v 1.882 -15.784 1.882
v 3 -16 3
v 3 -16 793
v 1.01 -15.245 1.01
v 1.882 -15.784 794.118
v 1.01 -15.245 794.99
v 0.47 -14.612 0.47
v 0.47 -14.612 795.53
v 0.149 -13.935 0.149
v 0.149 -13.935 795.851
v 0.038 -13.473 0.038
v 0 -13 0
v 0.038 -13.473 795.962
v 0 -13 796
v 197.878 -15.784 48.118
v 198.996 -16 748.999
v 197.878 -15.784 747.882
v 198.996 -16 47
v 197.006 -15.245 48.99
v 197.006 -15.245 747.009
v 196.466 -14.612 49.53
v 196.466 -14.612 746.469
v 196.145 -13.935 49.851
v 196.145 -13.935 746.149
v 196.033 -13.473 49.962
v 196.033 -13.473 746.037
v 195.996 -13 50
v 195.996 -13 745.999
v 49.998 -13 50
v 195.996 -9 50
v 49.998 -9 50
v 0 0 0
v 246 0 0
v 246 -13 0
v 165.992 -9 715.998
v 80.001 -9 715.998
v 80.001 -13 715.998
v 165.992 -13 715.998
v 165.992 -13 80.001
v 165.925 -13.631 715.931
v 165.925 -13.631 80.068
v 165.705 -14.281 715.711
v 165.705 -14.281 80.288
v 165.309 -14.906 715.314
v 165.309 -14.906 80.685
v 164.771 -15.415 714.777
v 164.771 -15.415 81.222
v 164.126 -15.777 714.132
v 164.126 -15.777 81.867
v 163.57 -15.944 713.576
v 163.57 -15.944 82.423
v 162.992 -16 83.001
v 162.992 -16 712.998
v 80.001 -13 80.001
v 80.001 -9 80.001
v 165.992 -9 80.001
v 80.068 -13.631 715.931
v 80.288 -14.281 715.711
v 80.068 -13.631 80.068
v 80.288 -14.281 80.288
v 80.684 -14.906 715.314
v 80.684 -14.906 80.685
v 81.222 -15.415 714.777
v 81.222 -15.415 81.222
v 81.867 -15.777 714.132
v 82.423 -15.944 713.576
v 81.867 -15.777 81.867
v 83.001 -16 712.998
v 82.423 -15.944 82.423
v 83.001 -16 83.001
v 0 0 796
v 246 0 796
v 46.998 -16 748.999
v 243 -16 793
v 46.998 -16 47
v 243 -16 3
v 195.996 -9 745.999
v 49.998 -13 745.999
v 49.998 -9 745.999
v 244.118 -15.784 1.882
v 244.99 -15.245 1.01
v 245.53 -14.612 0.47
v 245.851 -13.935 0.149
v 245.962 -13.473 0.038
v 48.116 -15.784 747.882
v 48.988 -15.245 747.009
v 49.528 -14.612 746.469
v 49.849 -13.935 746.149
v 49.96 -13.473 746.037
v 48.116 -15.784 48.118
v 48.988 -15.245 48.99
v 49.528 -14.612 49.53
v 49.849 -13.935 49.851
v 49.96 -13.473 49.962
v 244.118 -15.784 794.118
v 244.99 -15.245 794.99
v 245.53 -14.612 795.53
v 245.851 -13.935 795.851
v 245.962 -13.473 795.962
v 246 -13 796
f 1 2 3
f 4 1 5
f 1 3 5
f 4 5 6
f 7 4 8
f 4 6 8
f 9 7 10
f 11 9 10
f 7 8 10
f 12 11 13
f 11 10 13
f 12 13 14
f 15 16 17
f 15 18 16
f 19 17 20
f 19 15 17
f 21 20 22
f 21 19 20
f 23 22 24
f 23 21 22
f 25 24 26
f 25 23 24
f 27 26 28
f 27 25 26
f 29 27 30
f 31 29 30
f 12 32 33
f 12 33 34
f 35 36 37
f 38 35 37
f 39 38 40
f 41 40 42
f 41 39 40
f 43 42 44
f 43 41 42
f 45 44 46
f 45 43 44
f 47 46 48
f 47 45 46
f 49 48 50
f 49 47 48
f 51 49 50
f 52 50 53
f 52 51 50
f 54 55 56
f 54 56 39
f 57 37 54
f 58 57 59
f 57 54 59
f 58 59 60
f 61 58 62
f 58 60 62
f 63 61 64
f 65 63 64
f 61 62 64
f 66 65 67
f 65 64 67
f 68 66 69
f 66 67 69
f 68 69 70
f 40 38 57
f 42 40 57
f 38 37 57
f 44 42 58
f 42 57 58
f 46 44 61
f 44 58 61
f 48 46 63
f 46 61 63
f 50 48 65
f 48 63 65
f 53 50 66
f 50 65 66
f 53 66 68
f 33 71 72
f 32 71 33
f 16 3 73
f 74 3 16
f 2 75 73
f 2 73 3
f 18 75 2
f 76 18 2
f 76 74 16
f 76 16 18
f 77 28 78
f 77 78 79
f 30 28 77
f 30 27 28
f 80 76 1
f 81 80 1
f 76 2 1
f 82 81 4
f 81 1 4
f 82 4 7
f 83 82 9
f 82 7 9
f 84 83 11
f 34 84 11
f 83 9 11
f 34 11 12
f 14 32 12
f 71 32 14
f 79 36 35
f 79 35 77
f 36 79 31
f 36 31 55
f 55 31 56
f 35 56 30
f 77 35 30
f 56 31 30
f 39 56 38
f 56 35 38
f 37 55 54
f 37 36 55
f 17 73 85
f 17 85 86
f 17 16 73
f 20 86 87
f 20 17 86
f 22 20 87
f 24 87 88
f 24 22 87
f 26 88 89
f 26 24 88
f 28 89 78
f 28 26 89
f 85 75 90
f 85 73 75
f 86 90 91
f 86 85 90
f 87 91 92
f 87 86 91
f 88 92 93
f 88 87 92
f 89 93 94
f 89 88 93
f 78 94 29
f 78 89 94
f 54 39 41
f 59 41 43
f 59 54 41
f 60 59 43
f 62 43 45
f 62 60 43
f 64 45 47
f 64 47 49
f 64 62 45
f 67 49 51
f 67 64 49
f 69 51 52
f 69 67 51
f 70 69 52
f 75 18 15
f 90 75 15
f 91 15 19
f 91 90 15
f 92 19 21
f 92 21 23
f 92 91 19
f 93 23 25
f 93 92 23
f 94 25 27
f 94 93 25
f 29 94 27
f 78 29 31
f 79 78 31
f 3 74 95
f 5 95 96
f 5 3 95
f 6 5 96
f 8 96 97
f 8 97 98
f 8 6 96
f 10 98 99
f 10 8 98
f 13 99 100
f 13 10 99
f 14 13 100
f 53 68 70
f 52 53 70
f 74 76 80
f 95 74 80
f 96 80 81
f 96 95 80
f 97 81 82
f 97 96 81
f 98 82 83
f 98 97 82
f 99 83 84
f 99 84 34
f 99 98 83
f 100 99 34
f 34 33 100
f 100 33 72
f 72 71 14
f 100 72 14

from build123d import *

# Parameters (mm, degrees)
F0_W      = 44.656470418
F0_H      = 33.8078811765
F1_DEPTH  = 16
F2_DEPTH  = 796
F3_DEPTH  = 196
F4_W      = 68.9578056335
F4_H      = 493.6993122101
F5_DEPTH  = 7
F6_DEPTH  = 9.7
F7_DEPTH  = 99.33
F8_DEPTH  = 99.33
F9_DEPTH  = 17.34
F10_DEPTH = 102.97
F11_W     = 35.2807044983
F11_H     = 492.0964837074
F12_DEPTH = 7
F13_DEPTH = 37.27
F14_DEPTH = 6.58
F15_DEPTH = 106.63
F16_DEPTH = 5.87
F17_DEPTH = 200
F18_DEPTH = 200
F19_DEPTH = 200
F20_DEPTH = 200
F21_DEPTH = 200
F22_DEPTH = 200
F23_DEPTH = 350
F24_DEPTH = 350
F25_DEPTH = 350
F26_R     = 3


with BuildPart() as f1:
    # F0 (on Front) → F1 (new body)
    with BuildSketch(Plane.XZ):
        with Locations((22.328235209, 16.9039405882)):
            Rectangle(F0_W, F0_H)
    extrude(amount=F1_DEPTH)

    # F2 (add): a face of the model
    f2_faces = [f1.faces().sort_by_distance(p)[0] for p in [
        (22.328235209, -8, 0),
    ]]
    extrude(f2_faces, amount=-F2_DEPTH)

    # F3 (add): a face of the model
    f3_faces = [f1.faces().sort_by_distance(p)[0] for p in [
        (0, -8, 398),
    ]]
    extrude(f3_faces, amount=-F3_DEPTH)

    # F4 (on face) → F5 (cut)
    with BuildSketch(Plane.XZ.offset(16)):
        with Locations((94.1769480705, 399.8196721077)):
            Rectangle(F4_W, F4_H)
    extrude(amount=-F5_DEPTH, mode=Mode.SUBTRACT)

    # F6 (cut): a face of the model
    f6_faces = [f1.faces().sort_by_distance(p)[0] for p in [
        (59.6980452538, -12.5, 399.8196721077),
    ]]
    extrude(f6_faces, amount=-F6_DEPTH, mode=Mode.SUBTRACT)

    # F7 (add): a face of the model
    f7_faces = [f1.faces().sort_by_distance(p)[0] for p in [
        (89.3269480705, -12.5, 646.6693282127),
    ]]
    extrude(f7_faces, amount=-F7_DEPTH)

    # F8 (cut): a face of the model
    f8_faces = [f1.faces().sort_by_distance(p)[0] for p in [
        (89.3269480705, -12.5, 646.6693282127),
    ]]
    extrude(f8_faces, amount=-F8_DEPTH, mode=Mode.SUBTRACT)

    # F9 (cut): a face of the model
    f9_faces = [f1.faces().sort_by_distance(p)[0] for p in [
        (128.6558508873, -12.5, 449.4846721077),
    ]]
    extrude(f9_faces, amount=-F9_DEPTH, mode=Mode.SUBTRACT)

    # F10 (cut): a face of the model
    f10_faces = [f1.faces().sort_by_distance(p)[0] for p in [
        (97.9969480705, -12.5, 152.9700160027),
    ]]
    extrude(f10_faces, amount=-F10_DEPTH, mode=Mode.SUBTRACT)

    # F11 (on face) → F12 (join)
    with BuildSketch(Plane.XZ.offset(9)):
        with Locations((91.7714834213, 432.6795041561)):
            Rectangle(F11_W, F11_H)
    extrude(amount=F12_DEPTH)

    # F13 (add): a face of the model
    f13_faces = [f1.faces().sort_by_distance(p)[0] for p in [
        (91.7714834213, -12.5, 678.7277460098),
    ]]
    extrude(f13_faces, amount=F13_DEPTH)

    # F14 (add): a face of the model
    f14_faces = [f1.faces().sort_by_distance(p)[0] for p in [
        (109.4118356705, -12.5, 451.3145041561),
    ]]
    extrude(f14_faces, amount=F14_DEPTH)

    # F15 (add): a face of the model
    f15_faces = [f1.faces().sort_by_distance(p)[0] for p in [
        (95.0614834213, -12.5, 186.6312623024),
    ]]
    extrude(f15_faces, amount=F15_DEPTH)

    # F16 (cut): a face of the model
    f16_faces = [f1.faces().sort_by_distance(p)[0] for p in [
        (74.1311311722, -12.5, 397.9995041561),
    ]]
    extrude(f16_faces, amount=-F16_DEPTH, mode=Mode.SUBTRACT)

    # F17 (add): a face of the model
    f17_faces = [f1.faces().sort_by_distance(p)[0] for p in [
        (196, -8, 398),
    ]]
    extrude(f17_faces, amount=F17_DEPTH)

    # F18 (cut): a face of the model
    f18_faces = [f1.faces().sort_by_distance(p)[0] for p in [
        (145.9958508873, -12.5, 397.9996721077),
    ]]
    extrude(f18_faces, amount=-F18_DEPTH, mode=Mode.SUBTRACT)

    # F19 (add): a face of the model
    f19_faces = [f1.faces().sort_by_distance(p)[0] for p in [
        (115.9918356705, -12.5, 397.9995041561),
    ]]
    extrude(f19_faces, amount=F19_DEPTH)

    # F20 (add): a face of the model
    f20_faces = [f1.faces().sort_by_distance(p)[0] for p in [
        (396, -8, 398),
    ]]
    extrude(f20_faces, amount=F20_DEPTH)

    # F21 (cut): a face of the model
    f21_faces = [f1.faces().sort_by_distance(p)[0] for p in [
        (345.9958508873, -12.5, 397.9996721077),
    ]]
    extrude(f21_faces, amount=-F21_DEPTH, mode=Mode.SUBTRACT)

    # F22 (add): a face of the model
    f22_faces = [f1.faces().sort_by_distance(p)[0] for p in [
        (315.9918356705, -12.5, 397.9995041561),
    ]]
    extrude(f22_faces, amount=F22_DEPTH)

    # F23 (cut): a face of the model
    f23_faces = [f1.faces().sort_by_distance(p)[0] for p in [
        (515.9918356705, -12.5, 397.9995041561),
    ]]
    extrude(f23_faces, amount=-F23_DEPTH, mode=Mode.SUBTRACT)

    # F24 (add): a face of the model
    f24_faces = [f1.faces().sort_by_distance(p)[0] for p in [
        (545.9958508873, -12.5, 397.9996721077),
    ]]
    extrude(f24_faces, amount=F24_DEPTH)

    # F25 (cut): a face of the model
    f25_faces = [f1.faces().sort_by_distance(p)[0] for p in [
        (596, -8, 398),
    ]]
    extrude(f25_faces, amount=-F25_DEPTH, mode=Mode.SUBTRACT)

    # F26
    f26_edges = [f1.edges().sort_by_distance(p)[0] for p in [
        (122.996483, -16, 715.997746),
        (165.991836, -16, 397.999504),
        (122.996483, -16, 80.001262),
        (80.001131, -16, 397.999504),
        (0, -16, 398),
        (123, -16, 796),
        (246, -16, 398),
        (123, -16, 0),
        (49.998045, -16, 397.999672),
        (122.996948, -16, 50.000016),
        (122.996948, -16, 745.999328),
        (195.995851, -16, 397.999672),
    ]]
    fillet(f26_edges, radius=F26_R)


solid = f1.part
